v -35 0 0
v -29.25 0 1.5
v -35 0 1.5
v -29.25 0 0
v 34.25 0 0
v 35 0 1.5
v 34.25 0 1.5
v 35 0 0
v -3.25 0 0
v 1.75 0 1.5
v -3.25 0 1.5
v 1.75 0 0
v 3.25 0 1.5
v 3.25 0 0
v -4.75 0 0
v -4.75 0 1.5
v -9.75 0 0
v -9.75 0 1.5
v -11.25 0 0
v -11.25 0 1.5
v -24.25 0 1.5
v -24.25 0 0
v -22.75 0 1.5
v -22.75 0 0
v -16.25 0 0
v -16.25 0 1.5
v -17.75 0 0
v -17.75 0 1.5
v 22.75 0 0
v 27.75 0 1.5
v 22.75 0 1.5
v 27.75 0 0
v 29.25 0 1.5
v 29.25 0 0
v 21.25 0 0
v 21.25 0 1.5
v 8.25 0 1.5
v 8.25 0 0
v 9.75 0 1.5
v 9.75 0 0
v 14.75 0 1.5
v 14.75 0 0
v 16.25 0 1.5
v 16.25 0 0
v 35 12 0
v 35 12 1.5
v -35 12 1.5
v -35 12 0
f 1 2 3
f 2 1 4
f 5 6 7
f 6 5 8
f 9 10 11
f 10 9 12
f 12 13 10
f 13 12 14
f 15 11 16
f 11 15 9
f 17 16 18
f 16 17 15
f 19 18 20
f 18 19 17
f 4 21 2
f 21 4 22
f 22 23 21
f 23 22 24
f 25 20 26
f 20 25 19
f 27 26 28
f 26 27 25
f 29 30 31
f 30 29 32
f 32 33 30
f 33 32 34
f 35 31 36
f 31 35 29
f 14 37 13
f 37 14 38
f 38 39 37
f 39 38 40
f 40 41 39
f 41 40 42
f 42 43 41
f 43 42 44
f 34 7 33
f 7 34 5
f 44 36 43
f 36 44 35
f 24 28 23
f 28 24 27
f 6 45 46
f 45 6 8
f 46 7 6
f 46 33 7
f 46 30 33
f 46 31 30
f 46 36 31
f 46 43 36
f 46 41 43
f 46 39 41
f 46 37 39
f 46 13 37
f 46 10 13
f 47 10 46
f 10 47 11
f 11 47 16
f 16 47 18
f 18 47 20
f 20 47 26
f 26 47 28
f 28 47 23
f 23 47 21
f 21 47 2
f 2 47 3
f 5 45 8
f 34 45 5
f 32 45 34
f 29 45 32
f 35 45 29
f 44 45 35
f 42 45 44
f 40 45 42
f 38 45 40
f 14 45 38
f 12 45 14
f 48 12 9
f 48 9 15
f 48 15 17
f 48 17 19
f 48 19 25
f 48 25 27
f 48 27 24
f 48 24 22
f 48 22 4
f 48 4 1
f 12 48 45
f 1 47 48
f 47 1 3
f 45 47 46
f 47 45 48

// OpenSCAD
// 10-well comb for agarose gel casting, printed lying flat
// Units: mm

plate_t      = 1.5;   // plate thickness (Z)
spine_len    = 70;    // spine length (X)
spine_w      = 12;    // spine width (Y)
tooth_count  = 10;    // number of teeth
tooth_w      = 5.0;   // tooth width (X)
tooth_len    = 12;    // tooth length (Y)
tooth_gap    = 1.5;   // gap between teeth (X)
eps          = 0.5;   // cutter overshoot

$fn = 64;

pitch = tooth_w + tooth_gap;  // 6.5 mm
x0    = -(tooth_count - 1) * pitch / 2;  // first tooth left edge

difference() {
    // Spine
    translate([-spine_len / 2, 0, 0])
        cube([spine_len, spine_w, plate_t]);

    // Teeth
    for (i = [0 : tooth_count - 1])
        translate([x0 + i * pitch, -tooth_len, 0])
            cube([tooth_w, tooth_len, plate_t + eps]);
}
